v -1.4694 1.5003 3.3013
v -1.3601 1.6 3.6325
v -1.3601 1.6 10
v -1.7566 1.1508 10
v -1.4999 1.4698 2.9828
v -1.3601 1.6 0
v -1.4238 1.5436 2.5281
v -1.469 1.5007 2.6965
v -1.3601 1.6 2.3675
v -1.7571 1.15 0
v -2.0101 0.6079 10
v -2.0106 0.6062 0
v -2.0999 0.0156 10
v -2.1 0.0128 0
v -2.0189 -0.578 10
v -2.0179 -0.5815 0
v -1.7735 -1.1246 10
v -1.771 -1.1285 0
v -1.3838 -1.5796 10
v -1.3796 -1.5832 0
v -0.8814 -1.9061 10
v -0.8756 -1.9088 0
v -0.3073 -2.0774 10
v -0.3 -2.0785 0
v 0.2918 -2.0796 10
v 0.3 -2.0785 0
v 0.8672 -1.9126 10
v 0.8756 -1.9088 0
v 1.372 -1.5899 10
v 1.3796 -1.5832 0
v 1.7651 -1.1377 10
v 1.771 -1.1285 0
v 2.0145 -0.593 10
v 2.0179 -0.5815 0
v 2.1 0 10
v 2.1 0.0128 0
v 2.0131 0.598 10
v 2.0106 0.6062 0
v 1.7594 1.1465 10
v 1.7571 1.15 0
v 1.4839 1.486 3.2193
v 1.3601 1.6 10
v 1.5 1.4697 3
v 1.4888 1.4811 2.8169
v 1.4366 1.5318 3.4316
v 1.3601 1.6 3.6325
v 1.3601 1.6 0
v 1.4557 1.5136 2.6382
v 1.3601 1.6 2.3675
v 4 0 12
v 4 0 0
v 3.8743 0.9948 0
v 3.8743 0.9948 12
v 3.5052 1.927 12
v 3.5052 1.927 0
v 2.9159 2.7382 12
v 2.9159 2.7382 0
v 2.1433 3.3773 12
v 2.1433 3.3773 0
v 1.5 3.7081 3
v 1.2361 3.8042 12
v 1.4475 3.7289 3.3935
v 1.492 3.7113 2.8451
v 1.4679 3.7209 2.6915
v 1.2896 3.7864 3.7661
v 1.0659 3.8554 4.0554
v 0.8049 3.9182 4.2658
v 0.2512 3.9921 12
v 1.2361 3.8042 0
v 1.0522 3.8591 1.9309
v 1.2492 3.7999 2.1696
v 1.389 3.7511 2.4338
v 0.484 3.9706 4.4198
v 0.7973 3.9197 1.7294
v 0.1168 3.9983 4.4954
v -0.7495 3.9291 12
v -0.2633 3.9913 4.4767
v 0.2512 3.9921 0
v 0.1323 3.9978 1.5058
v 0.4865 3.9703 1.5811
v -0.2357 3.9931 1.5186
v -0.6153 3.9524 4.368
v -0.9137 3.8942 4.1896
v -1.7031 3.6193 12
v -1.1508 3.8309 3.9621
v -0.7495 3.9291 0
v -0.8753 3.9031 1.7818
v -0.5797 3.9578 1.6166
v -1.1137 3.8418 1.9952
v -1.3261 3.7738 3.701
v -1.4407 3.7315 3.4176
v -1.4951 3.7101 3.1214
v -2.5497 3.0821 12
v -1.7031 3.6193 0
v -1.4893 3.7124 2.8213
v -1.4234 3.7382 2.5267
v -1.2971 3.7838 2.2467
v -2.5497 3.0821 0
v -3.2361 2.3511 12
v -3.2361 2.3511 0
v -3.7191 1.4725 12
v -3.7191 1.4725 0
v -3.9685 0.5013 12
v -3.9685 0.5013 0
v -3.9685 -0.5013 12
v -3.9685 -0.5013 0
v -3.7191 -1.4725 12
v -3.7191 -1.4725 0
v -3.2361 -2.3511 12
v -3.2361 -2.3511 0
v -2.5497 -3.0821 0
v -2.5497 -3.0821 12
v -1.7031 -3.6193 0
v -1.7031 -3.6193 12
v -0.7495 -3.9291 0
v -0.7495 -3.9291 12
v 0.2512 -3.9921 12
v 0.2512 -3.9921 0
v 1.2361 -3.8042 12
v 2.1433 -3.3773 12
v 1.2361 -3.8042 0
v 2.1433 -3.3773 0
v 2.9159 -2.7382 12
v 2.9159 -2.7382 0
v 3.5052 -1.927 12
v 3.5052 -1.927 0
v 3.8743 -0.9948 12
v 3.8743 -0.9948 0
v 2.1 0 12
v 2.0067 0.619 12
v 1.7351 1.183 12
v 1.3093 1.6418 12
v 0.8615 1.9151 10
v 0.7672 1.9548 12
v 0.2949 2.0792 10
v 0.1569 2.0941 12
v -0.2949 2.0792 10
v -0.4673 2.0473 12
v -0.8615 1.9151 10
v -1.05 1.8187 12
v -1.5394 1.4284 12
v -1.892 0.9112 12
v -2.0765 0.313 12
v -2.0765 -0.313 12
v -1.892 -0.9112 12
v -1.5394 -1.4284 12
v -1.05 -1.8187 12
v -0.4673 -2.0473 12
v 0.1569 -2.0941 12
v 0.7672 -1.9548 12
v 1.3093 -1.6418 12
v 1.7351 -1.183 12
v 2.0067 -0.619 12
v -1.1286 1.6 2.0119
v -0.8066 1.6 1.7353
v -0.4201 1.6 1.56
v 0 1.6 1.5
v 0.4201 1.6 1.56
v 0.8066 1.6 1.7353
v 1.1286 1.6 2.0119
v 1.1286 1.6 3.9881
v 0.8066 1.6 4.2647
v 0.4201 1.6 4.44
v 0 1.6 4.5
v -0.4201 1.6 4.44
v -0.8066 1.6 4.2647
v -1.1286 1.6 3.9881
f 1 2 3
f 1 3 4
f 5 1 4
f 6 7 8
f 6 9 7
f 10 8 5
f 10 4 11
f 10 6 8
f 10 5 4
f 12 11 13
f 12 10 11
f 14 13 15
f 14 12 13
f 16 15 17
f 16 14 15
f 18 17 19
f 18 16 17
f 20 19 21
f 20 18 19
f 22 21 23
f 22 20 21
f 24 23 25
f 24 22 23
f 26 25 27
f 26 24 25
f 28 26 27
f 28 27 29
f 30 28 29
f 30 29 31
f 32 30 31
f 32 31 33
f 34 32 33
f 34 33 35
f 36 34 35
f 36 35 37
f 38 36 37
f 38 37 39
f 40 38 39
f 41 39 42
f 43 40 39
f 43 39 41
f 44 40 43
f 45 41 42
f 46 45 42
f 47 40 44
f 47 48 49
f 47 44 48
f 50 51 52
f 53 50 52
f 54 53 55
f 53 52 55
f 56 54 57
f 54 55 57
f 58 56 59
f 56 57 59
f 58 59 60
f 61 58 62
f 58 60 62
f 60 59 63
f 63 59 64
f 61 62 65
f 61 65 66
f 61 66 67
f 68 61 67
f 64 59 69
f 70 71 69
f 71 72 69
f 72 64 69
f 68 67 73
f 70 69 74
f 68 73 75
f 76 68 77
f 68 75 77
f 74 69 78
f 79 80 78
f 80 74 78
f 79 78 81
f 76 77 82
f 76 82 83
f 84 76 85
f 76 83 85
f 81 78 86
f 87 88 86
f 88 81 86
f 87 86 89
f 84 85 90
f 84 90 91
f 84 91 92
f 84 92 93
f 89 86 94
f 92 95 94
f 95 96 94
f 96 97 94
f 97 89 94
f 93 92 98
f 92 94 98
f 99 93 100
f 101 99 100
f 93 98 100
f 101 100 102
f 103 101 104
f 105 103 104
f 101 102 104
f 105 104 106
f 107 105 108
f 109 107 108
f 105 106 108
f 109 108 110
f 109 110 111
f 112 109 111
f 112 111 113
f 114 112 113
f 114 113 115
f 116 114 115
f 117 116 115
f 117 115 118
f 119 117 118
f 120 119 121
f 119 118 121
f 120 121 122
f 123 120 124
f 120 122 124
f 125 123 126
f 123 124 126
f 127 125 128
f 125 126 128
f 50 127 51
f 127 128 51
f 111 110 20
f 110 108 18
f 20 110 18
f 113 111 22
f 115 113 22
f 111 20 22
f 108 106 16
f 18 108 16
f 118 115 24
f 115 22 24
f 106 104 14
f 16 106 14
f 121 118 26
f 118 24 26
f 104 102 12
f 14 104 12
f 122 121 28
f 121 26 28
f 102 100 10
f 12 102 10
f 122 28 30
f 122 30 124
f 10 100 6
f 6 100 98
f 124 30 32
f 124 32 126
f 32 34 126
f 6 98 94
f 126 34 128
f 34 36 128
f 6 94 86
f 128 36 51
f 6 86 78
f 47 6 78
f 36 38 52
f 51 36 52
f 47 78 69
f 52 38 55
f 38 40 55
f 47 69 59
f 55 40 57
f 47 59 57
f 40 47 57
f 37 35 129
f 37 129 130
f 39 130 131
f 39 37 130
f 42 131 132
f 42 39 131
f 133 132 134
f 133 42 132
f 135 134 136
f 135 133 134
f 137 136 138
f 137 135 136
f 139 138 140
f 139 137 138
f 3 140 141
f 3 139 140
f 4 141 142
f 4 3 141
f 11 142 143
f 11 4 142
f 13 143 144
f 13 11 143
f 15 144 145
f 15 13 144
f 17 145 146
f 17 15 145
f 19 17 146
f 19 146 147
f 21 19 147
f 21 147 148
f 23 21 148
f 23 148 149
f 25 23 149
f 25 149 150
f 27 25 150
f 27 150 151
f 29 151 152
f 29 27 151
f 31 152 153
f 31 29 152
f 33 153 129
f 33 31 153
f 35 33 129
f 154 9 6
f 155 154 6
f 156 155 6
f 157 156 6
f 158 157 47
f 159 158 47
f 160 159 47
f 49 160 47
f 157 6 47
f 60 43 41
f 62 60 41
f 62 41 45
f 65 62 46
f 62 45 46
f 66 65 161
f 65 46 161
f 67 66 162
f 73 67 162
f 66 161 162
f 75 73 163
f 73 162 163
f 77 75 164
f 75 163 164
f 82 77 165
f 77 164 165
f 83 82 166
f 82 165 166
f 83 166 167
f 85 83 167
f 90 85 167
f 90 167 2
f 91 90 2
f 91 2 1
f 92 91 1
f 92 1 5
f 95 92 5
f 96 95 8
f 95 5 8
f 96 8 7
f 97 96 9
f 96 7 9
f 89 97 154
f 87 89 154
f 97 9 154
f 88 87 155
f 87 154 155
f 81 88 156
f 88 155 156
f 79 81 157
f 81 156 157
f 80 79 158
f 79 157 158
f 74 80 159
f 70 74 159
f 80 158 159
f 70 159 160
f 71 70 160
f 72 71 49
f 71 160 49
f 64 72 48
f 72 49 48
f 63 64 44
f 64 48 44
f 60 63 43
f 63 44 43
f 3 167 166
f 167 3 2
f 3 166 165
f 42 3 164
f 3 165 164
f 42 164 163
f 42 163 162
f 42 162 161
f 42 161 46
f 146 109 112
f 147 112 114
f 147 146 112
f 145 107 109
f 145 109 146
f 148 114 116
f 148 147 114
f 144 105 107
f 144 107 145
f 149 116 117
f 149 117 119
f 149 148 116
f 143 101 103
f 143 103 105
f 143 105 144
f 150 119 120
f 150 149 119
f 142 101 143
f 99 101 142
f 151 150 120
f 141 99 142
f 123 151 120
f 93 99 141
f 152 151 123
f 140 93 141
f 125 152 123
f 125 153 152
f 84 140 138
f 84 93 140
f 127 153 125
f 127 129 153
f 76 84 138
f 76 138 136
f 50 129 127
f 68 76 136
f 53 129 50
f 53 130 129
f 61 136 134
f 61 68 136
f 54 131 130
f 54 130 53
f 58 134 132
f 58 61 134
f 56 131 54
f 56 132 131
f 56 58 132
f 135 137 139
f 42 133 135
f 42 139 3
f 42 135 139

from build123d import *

# Parameters (mm, degrees)
SKETCH268_R     = 4
PAD107_DEPTH    = 10
SKETCH269_R     = 4
SKETCH269_R_2   = 2.1
PAD108_DEPTH    = 2
SKETCH270_R     = 1.5
POCKET131_DEPTH = 4.001


with BuildPart() as part:
    # Sketch268 → Pad107 (new body)
    with BuildSketch(Plane.XY):
        Circle(SKETCH268_R)
        with BuildLine():
            Line((-1.360147, 1.6), (1.360147, 1.6))
            ThreePointArc((-1.360147, 1.6), (0, -2.1), (1.360147, 1.6))
        make_face(mode=Mode.SUBTRACT)
    extrude(amount=PAD107_DEPTH)

    # Sketch269 (on Face5 of Pad107) → Pad108 (join)
    with BuildSketch(Plane.XY.offset(10)):
        Circle(SKETCH269_R)
        Circle(SKETCH269_R_2, mode=Mode.SUBTRACT)
    extrude(amount=PAD108_DEPTH)

    # Sketch270 → Pocket131 (cut, through all)
    with BuildSketch(Plane.XZ):
        with Locations((0, 3)):
            Circle(SKETCH270_R)
    extrude(amount=-POCKET131_DEPTH, mode=Mode.SUBTRACT)


solid = part.part
